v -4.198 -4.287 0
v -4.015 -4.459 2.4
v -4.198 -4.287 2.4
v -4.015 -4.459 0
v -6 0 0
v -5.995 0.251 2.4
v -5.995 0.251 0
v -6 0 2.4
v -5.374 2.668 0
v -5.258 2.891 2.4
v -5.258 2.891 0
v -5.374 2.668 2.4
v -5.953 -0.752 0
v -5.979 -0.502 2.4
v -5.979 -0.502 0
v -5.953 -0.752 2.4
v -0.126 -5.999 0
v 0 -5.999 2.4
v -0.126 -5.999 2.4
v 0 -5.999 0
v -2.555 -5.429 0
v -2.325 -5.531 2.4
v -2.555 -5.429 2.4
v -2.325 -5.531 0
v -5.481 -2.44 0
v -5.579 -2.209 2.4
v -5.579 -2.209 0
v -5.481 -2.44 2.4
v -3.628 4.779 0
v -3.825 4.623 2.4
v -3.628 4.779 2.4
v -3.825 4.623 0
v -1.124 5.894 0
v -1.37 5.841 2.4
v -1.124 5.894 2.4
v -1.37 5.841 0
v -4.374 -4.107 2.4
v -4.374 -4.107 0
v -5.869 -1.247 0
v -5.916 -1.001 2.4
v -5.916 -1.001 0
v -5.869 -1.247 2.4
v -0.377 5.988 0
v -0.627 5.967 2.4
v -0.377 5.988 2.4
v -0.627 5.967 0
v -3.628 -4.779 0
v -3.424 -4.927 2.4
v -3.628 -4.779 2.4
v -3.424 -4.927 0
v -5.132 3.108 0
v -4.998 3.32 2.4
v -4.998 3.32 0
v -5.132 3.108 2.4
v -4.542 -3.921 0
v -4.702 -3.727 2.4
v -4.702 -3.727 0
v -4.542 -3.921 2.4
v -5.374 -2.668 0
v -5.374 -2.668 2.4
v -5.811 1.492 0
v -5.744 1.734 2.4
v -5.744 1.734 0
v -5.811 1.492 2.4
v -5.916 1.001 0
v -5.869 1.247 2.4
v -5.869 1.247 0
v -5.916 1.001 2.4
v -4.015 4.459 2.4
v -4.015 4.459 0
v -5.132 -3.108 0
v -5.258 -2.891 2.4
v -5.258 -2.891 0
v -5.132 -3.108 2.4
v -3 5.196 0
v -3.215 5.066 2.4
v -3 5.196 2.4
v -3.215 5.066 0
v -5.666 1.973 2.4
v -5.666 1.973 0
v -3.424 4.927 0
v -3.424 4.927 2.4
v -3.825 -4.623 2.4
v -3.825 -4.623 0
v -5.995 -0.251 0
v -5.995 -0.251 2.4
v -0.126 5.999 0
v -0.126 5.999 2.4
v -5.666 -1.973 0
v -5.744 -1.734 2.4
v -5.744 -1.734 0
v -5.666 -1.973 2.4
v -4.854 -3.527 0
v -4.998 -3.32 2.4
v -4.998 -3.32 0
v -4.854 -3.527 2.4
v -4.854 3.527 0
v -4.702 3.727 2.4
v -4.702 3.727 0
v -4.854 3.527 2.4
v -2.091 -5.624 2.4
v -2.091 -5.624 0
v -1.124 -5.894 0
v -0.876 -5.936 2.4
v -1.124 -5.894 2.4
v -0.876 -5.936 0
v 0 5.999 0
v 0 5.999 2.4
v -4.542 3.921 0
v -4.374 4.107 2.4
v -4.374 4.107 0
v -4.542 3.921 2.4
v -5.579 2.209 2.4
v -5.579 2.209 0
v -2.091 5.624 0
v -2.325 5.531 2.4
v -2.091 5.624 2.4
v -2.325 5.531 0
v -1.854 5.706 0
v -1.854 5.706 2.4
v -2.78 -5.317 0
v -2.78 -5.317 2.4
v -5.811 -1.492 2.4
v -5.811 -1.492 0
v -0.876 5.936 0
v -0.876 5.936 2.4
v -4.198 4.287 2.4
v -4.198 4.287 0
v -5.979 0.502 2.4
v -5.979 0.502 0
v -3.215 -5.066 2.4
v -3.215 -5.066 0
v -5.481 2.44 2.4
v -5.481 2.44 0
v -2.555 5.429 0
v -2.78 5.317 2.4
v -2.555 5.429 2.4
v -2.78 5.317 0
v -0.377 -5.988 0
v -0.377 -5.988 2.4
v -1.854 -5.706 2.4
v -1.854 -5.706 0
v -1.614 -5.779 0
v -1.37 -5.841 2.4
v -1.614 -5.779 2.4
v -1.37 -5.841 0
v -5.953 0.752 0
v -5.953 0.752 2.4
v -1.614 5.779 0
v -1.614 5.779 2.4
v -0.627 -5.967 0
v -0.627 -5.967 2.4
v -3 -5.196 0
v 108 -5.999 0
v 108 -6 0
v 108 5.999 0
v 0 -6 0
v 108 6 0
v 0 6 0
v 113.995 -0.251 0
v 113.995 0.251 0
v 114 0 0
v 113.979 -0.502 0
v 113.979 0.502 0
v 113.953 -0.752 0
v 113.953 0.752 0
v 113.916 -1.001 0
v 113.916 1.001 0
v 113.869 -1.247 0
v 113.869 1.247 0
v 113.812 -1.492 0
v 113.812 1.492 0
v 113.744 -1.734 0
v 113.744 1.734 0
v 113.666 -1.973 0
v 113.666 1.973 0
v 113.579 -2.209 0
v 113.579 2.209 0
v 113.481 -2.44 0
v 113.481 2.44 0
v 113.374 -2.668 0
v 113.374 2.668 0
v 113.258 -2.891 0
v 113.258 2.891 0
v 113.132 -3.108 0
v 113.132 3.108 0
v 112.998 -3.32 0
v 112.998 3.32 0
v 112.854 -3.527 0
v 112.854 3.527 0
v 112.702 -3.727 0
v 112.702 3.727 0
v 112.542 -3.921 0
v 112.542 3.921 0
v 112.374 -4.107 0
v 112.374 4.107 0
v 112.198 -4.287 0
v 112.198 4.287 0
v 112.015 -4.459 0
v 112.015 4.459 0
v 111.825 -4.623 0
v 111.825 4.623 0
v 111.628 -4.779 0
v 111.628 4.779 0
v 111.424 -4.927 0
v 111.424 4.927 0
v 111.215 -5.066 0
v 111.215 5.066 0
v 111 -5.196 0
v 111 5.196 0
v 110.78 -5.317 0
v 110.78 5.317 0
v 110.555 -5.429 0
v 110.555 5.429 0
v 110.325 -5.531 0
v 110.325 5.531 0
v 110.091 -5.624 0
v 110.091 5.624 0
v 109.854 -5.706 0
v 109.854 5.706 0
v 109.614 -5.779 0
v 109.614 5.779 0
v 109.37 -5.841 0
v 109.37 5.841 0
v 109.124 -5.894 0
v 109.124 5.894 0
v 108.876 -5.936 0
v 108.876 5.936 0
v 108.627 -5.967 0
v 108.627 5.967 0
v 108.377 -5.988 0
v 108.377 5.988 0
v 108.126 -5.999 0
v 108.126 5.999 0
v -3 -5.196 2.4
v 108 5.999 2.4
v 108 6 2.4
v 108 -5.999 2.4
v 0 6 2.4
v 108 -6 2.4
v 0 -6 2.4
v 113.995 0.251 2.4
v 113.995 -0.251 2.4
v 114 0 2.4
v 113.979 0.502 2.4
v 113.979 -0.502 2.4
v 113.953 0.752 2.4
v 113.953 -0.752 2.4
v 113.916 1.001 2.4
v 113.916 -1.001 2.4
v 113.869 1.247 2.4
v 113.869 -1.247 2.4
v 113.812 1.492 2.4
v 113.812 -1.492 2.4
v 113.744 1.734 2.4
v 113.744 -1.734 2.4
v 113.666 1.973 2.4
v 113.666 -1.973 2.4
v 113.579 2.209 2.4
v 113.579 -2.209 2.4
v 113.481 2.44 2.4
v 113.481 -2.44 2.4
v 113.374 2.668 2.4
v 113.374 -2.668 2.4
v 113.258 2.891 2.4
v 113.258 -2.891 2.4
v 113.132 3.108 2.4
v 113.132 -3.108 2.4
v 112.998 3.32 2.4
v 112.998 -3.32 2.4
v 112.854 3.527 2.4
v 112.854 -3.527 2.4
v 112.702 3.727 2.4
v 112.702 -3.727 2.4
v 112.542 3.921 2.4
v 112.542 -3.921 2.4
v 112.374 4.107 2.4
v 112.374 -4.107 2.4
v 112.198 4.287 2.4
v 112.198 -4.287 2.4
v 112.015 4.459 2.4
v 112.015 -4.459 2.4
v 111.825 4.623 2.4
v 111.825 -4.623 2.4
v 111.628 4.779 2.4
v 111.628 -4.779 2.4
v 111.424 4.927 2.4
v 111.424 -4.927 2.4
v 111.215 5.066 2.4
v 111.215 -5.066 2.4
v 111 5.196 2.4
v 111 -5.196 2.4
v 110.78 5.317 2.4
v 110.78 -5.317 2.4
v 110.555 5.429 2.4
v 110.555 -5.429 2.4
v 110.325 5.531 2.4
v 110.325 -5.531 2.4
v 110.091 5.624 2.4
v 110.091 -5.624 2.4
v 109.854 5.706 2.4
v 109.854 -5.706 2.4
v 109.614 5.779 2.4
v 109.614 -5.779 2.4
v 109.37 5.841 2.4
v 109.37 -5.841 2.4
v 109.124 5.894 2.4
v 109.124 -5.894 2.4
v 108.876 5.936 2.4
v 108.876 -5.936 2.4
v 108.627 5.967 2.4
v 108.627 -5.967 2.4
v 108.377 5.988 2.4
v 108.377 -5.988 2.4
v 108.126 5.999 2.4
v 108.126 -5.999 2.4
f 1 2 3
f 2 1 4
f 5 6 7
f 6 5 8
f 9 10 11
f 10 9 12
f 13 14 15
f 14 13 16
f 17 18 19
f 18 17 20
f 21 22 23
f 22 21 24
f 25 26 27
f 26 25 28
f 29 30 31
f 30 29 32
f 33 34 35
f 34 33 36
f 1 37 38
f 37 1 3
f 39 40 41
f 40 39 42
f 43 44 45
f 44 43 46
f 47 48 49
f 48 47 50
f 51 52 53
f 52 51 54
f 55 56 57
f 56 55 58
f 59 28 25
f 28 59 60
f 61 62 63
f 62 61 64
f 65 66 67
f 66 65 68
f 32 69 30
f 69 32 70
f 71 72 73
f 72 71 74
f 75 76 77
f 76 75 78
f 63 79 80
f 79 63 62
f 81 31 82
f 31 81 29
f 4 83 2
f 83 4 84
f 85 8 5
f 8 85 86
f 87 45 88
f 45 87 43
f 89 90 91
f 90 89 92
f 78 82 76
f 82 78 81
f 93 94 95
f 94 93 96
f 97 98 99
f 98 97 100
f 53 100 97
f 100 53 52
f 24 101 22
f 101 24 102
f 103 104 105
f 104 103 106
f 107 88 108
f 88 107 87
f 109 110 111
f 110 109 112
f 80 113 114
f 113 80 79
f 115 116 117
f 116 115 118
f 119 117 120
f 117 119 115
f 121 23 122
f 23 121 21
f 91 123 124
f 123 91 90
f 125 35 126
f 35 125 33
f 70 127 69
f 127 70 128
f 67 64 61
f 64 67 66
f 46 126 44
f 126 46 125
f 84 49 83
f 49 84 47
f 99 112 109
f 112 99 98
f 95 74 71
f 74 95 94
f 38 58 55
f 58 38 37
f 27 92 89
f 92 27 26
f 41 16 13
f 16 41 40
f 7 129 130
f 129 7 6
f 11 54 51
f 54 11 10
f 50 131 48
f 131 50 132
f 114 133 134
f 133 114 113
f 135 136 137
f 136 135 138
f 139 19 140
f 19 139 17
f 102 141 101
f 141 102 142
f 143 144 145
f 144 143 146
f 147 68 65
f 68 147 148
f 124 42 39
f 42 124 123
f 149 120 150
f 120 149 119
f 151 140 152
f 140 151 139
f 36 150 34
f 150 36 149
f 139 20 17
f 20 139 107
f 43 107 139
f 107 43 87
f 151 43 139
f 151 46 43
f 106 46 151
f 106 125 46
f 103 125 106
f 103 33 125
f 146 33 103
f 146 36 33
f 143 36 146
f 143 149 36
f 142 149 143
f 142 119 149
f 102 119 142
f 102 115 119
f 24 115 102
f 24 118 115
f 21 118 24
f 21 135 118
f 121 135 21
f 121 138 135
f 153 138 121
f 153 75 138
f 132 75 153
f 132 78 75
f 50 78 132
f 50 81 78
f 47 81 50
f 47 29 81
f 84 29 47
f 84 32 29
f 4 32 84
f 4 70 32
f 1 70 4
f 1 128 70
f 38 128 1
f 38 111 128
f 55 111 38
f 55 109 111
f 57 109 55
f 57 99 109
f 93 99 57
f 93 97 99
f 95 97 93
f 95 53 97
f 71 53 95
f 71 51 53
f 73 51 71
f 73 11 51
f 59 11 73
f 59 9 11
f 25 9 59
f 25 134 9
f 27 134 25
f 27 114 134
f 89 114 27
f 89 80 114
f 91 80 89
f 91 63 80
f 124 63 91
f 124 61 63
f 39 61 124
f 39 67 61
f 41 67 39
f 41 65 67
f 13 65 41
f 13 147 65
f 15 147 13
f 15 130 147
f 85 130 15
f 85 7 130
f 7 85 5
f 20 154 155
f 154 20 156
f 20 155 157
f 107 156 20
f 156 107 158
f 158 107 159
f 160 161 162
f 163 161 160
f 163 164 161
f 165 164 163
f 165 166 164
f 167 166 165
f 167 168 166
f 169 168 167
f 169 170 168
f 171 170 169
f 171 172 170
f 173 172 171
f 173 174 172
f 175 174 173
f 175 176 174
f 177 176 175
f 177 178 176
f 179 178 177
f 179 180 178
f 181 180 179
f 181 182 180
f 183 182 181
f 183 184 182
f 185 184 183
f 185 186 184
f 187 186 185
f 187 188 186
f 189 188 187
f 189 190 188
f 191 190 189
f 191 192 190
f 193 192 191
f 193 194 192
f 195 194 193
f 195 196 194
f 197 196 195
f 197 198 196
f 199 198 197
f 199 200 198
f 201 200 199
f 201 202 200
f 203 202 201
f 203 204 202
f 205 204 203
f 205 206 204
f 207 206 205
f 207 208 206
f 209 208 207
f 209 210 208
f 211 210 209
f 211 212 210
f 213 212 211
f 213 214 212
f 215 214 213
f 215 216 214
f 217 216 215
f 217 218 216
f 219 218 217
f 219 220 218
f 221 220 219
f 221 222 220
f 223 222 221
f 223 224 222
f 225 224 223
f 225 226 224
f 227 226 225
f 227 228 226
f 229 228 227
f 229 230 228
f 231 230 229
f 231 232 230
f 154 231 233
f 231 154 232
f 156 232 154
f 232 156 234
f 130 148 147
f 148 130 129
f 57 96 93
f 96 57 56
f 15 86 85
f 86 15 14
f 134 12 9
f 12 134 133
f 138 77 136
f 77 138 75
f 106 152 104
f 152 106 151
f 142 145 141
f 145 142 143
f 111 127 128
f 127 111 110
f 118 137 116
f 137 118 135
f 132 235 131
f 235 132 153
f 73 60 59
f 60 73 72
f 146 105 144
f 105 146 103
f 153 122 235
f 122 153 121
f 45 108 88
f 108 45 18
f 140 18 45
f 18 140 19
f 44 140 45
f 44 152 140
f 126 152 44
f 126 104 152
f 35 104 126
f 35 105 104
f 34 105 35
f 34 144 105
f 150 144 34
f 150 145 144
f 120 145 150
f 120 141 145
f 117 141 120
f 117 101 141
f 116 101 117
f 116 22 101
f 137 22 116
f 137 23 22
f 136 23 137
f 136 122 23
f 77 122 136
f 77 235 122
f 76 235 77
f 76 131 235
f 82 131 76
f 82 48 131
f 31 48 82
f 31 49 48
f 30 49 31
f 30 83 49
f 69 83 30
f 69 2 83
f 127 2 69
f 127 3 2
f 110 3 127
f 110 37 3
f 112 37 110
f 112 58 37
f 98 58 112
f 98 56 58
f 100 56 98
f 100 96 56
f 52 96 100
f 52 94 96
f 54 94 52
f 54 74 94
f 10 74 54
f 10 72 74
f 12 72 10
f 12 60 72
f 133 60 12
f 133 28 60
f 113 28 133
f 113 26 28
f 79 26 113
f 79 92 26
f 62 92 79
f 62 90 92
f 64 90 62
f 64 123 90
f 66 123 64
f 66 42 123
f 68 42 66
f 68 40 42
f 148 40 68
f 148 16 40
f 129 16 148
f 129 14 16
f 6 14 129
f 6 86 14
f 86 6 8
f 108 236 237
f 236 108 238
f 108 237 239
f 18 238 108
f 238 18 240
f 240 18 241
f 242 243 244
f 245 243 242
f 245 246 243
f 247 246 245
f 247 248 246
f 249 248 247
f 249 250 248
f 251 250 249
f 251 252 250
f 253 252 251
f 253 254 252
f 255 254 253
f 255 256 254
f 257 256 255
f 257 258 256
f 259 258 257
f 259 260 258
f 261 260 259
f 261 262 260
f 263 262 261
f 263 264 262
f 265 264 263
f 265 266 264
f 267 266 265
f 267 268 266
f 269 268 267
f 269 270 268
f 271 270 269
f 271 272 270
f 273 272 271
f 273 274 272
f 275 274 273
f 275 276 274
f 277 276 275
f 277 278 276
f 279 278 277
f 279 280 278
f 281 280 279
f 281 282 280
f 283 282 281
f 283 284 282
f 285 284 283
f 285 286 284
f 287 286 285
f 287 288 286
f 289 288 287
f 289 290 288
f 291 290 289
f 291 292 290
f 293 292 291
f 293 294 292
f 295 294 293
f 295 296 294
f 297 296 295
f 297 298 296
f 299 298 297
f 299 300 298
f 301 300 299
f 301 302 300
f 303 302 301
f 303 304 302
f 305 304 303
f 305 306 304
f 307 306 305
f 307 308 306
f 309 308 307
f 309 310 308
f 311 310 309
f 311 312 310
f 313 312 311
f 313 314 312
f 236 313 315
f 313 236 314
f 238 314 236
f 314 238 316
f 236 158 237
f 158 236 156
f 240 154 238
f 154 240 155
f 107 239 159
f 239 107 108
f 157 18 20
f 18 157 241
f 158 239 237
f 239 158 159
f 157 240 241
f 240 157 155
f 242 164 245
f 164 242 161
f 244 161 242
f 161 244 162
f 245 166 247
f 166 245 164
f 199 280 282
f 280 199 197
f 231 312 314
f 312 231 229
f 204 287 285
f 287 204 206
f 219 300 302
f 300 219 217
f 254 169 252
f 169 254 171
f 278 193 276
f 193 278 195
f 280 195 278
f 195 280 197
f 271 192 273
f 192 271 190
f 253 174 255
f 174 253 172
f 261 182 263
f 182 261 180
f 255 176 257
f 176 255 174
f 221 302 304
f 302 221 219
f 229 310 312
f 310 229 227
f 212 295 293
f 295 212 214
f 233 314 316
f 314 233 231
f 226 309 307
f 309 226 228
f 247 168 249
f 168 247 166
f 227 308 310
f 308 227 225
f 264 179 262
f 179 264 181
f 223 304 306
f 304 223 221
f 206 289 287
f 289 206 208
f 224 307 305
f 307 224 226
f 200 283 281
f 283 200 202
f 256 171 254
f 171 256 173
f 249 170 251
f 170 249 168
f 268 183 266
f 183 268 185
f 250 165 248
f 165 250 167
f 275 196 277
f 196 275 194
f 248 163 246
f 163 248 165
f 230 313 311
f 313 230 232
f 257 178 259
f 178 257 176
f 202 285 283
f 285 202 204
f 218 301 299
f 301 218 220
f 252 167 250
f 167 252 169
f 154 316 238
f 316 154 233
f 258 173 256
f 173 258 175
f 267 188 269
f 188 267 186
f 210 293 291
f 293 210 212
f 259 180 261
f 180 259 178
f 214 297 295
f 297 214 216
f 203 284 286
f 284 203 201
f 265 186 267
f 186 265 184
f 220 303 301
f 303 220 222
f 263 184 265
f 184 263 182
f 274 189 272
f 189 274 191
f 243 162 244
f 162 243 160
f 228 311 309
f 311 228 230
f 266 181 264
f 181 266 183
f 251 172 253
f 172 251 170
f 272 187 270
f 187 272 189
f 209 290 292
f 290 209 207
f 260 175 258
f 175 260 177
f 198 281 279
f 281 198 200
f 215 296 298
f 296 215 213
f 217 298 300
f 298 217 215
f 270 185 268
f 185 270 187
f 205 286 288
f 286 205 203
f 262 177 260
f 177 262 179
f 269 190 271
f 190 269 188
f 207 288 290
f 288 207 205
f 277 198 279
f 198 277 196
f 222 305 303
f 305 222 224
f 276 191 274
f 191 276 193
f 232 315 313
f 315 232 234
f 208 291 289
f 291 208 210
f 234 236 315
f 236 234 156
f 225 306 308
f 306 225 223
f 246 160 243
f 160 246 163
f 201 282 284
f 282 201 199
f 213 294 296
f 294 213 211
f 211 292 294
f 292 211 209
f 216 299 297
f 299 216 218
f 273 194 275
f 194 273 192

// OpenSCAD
$fn=150;
width=12;
length=120;
height=2.4;

cylinder (d=width,h=height);
translate ([0,-width/2,0])
cube([length-width,width, height]);
translate ([length-width,0,0])
cylinder (d=width, h=height);
